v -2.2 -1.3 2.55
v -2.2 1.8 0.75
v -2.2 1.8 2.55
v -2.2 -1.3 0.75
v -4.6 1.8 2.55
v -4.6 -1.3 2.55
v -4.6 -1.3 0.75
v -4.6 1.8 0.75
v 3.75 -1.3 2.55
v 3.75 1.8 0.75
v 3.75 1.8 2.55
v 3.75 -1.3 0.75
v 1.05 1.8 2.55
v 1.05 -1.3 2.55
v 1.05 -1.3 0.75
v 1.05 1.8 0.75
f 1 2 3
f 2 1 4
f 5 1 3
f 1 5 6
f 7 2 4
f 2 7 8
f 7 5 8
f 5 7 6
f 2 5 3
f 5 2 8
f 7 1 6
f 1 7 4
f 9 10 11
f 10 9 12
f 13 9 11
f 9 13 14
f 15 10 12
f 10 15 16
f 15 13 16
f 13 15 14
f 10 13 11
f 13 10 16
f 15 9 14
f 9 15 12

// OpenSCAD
union() {
  translate([-4.6, -1.3, 0.75]) cube(size=[2.4,3.1,1.8], center=false);
  translate([1.05, -1.3, 0.75]) cube(size=[2.7,3.1,1.8], center=false);
}
